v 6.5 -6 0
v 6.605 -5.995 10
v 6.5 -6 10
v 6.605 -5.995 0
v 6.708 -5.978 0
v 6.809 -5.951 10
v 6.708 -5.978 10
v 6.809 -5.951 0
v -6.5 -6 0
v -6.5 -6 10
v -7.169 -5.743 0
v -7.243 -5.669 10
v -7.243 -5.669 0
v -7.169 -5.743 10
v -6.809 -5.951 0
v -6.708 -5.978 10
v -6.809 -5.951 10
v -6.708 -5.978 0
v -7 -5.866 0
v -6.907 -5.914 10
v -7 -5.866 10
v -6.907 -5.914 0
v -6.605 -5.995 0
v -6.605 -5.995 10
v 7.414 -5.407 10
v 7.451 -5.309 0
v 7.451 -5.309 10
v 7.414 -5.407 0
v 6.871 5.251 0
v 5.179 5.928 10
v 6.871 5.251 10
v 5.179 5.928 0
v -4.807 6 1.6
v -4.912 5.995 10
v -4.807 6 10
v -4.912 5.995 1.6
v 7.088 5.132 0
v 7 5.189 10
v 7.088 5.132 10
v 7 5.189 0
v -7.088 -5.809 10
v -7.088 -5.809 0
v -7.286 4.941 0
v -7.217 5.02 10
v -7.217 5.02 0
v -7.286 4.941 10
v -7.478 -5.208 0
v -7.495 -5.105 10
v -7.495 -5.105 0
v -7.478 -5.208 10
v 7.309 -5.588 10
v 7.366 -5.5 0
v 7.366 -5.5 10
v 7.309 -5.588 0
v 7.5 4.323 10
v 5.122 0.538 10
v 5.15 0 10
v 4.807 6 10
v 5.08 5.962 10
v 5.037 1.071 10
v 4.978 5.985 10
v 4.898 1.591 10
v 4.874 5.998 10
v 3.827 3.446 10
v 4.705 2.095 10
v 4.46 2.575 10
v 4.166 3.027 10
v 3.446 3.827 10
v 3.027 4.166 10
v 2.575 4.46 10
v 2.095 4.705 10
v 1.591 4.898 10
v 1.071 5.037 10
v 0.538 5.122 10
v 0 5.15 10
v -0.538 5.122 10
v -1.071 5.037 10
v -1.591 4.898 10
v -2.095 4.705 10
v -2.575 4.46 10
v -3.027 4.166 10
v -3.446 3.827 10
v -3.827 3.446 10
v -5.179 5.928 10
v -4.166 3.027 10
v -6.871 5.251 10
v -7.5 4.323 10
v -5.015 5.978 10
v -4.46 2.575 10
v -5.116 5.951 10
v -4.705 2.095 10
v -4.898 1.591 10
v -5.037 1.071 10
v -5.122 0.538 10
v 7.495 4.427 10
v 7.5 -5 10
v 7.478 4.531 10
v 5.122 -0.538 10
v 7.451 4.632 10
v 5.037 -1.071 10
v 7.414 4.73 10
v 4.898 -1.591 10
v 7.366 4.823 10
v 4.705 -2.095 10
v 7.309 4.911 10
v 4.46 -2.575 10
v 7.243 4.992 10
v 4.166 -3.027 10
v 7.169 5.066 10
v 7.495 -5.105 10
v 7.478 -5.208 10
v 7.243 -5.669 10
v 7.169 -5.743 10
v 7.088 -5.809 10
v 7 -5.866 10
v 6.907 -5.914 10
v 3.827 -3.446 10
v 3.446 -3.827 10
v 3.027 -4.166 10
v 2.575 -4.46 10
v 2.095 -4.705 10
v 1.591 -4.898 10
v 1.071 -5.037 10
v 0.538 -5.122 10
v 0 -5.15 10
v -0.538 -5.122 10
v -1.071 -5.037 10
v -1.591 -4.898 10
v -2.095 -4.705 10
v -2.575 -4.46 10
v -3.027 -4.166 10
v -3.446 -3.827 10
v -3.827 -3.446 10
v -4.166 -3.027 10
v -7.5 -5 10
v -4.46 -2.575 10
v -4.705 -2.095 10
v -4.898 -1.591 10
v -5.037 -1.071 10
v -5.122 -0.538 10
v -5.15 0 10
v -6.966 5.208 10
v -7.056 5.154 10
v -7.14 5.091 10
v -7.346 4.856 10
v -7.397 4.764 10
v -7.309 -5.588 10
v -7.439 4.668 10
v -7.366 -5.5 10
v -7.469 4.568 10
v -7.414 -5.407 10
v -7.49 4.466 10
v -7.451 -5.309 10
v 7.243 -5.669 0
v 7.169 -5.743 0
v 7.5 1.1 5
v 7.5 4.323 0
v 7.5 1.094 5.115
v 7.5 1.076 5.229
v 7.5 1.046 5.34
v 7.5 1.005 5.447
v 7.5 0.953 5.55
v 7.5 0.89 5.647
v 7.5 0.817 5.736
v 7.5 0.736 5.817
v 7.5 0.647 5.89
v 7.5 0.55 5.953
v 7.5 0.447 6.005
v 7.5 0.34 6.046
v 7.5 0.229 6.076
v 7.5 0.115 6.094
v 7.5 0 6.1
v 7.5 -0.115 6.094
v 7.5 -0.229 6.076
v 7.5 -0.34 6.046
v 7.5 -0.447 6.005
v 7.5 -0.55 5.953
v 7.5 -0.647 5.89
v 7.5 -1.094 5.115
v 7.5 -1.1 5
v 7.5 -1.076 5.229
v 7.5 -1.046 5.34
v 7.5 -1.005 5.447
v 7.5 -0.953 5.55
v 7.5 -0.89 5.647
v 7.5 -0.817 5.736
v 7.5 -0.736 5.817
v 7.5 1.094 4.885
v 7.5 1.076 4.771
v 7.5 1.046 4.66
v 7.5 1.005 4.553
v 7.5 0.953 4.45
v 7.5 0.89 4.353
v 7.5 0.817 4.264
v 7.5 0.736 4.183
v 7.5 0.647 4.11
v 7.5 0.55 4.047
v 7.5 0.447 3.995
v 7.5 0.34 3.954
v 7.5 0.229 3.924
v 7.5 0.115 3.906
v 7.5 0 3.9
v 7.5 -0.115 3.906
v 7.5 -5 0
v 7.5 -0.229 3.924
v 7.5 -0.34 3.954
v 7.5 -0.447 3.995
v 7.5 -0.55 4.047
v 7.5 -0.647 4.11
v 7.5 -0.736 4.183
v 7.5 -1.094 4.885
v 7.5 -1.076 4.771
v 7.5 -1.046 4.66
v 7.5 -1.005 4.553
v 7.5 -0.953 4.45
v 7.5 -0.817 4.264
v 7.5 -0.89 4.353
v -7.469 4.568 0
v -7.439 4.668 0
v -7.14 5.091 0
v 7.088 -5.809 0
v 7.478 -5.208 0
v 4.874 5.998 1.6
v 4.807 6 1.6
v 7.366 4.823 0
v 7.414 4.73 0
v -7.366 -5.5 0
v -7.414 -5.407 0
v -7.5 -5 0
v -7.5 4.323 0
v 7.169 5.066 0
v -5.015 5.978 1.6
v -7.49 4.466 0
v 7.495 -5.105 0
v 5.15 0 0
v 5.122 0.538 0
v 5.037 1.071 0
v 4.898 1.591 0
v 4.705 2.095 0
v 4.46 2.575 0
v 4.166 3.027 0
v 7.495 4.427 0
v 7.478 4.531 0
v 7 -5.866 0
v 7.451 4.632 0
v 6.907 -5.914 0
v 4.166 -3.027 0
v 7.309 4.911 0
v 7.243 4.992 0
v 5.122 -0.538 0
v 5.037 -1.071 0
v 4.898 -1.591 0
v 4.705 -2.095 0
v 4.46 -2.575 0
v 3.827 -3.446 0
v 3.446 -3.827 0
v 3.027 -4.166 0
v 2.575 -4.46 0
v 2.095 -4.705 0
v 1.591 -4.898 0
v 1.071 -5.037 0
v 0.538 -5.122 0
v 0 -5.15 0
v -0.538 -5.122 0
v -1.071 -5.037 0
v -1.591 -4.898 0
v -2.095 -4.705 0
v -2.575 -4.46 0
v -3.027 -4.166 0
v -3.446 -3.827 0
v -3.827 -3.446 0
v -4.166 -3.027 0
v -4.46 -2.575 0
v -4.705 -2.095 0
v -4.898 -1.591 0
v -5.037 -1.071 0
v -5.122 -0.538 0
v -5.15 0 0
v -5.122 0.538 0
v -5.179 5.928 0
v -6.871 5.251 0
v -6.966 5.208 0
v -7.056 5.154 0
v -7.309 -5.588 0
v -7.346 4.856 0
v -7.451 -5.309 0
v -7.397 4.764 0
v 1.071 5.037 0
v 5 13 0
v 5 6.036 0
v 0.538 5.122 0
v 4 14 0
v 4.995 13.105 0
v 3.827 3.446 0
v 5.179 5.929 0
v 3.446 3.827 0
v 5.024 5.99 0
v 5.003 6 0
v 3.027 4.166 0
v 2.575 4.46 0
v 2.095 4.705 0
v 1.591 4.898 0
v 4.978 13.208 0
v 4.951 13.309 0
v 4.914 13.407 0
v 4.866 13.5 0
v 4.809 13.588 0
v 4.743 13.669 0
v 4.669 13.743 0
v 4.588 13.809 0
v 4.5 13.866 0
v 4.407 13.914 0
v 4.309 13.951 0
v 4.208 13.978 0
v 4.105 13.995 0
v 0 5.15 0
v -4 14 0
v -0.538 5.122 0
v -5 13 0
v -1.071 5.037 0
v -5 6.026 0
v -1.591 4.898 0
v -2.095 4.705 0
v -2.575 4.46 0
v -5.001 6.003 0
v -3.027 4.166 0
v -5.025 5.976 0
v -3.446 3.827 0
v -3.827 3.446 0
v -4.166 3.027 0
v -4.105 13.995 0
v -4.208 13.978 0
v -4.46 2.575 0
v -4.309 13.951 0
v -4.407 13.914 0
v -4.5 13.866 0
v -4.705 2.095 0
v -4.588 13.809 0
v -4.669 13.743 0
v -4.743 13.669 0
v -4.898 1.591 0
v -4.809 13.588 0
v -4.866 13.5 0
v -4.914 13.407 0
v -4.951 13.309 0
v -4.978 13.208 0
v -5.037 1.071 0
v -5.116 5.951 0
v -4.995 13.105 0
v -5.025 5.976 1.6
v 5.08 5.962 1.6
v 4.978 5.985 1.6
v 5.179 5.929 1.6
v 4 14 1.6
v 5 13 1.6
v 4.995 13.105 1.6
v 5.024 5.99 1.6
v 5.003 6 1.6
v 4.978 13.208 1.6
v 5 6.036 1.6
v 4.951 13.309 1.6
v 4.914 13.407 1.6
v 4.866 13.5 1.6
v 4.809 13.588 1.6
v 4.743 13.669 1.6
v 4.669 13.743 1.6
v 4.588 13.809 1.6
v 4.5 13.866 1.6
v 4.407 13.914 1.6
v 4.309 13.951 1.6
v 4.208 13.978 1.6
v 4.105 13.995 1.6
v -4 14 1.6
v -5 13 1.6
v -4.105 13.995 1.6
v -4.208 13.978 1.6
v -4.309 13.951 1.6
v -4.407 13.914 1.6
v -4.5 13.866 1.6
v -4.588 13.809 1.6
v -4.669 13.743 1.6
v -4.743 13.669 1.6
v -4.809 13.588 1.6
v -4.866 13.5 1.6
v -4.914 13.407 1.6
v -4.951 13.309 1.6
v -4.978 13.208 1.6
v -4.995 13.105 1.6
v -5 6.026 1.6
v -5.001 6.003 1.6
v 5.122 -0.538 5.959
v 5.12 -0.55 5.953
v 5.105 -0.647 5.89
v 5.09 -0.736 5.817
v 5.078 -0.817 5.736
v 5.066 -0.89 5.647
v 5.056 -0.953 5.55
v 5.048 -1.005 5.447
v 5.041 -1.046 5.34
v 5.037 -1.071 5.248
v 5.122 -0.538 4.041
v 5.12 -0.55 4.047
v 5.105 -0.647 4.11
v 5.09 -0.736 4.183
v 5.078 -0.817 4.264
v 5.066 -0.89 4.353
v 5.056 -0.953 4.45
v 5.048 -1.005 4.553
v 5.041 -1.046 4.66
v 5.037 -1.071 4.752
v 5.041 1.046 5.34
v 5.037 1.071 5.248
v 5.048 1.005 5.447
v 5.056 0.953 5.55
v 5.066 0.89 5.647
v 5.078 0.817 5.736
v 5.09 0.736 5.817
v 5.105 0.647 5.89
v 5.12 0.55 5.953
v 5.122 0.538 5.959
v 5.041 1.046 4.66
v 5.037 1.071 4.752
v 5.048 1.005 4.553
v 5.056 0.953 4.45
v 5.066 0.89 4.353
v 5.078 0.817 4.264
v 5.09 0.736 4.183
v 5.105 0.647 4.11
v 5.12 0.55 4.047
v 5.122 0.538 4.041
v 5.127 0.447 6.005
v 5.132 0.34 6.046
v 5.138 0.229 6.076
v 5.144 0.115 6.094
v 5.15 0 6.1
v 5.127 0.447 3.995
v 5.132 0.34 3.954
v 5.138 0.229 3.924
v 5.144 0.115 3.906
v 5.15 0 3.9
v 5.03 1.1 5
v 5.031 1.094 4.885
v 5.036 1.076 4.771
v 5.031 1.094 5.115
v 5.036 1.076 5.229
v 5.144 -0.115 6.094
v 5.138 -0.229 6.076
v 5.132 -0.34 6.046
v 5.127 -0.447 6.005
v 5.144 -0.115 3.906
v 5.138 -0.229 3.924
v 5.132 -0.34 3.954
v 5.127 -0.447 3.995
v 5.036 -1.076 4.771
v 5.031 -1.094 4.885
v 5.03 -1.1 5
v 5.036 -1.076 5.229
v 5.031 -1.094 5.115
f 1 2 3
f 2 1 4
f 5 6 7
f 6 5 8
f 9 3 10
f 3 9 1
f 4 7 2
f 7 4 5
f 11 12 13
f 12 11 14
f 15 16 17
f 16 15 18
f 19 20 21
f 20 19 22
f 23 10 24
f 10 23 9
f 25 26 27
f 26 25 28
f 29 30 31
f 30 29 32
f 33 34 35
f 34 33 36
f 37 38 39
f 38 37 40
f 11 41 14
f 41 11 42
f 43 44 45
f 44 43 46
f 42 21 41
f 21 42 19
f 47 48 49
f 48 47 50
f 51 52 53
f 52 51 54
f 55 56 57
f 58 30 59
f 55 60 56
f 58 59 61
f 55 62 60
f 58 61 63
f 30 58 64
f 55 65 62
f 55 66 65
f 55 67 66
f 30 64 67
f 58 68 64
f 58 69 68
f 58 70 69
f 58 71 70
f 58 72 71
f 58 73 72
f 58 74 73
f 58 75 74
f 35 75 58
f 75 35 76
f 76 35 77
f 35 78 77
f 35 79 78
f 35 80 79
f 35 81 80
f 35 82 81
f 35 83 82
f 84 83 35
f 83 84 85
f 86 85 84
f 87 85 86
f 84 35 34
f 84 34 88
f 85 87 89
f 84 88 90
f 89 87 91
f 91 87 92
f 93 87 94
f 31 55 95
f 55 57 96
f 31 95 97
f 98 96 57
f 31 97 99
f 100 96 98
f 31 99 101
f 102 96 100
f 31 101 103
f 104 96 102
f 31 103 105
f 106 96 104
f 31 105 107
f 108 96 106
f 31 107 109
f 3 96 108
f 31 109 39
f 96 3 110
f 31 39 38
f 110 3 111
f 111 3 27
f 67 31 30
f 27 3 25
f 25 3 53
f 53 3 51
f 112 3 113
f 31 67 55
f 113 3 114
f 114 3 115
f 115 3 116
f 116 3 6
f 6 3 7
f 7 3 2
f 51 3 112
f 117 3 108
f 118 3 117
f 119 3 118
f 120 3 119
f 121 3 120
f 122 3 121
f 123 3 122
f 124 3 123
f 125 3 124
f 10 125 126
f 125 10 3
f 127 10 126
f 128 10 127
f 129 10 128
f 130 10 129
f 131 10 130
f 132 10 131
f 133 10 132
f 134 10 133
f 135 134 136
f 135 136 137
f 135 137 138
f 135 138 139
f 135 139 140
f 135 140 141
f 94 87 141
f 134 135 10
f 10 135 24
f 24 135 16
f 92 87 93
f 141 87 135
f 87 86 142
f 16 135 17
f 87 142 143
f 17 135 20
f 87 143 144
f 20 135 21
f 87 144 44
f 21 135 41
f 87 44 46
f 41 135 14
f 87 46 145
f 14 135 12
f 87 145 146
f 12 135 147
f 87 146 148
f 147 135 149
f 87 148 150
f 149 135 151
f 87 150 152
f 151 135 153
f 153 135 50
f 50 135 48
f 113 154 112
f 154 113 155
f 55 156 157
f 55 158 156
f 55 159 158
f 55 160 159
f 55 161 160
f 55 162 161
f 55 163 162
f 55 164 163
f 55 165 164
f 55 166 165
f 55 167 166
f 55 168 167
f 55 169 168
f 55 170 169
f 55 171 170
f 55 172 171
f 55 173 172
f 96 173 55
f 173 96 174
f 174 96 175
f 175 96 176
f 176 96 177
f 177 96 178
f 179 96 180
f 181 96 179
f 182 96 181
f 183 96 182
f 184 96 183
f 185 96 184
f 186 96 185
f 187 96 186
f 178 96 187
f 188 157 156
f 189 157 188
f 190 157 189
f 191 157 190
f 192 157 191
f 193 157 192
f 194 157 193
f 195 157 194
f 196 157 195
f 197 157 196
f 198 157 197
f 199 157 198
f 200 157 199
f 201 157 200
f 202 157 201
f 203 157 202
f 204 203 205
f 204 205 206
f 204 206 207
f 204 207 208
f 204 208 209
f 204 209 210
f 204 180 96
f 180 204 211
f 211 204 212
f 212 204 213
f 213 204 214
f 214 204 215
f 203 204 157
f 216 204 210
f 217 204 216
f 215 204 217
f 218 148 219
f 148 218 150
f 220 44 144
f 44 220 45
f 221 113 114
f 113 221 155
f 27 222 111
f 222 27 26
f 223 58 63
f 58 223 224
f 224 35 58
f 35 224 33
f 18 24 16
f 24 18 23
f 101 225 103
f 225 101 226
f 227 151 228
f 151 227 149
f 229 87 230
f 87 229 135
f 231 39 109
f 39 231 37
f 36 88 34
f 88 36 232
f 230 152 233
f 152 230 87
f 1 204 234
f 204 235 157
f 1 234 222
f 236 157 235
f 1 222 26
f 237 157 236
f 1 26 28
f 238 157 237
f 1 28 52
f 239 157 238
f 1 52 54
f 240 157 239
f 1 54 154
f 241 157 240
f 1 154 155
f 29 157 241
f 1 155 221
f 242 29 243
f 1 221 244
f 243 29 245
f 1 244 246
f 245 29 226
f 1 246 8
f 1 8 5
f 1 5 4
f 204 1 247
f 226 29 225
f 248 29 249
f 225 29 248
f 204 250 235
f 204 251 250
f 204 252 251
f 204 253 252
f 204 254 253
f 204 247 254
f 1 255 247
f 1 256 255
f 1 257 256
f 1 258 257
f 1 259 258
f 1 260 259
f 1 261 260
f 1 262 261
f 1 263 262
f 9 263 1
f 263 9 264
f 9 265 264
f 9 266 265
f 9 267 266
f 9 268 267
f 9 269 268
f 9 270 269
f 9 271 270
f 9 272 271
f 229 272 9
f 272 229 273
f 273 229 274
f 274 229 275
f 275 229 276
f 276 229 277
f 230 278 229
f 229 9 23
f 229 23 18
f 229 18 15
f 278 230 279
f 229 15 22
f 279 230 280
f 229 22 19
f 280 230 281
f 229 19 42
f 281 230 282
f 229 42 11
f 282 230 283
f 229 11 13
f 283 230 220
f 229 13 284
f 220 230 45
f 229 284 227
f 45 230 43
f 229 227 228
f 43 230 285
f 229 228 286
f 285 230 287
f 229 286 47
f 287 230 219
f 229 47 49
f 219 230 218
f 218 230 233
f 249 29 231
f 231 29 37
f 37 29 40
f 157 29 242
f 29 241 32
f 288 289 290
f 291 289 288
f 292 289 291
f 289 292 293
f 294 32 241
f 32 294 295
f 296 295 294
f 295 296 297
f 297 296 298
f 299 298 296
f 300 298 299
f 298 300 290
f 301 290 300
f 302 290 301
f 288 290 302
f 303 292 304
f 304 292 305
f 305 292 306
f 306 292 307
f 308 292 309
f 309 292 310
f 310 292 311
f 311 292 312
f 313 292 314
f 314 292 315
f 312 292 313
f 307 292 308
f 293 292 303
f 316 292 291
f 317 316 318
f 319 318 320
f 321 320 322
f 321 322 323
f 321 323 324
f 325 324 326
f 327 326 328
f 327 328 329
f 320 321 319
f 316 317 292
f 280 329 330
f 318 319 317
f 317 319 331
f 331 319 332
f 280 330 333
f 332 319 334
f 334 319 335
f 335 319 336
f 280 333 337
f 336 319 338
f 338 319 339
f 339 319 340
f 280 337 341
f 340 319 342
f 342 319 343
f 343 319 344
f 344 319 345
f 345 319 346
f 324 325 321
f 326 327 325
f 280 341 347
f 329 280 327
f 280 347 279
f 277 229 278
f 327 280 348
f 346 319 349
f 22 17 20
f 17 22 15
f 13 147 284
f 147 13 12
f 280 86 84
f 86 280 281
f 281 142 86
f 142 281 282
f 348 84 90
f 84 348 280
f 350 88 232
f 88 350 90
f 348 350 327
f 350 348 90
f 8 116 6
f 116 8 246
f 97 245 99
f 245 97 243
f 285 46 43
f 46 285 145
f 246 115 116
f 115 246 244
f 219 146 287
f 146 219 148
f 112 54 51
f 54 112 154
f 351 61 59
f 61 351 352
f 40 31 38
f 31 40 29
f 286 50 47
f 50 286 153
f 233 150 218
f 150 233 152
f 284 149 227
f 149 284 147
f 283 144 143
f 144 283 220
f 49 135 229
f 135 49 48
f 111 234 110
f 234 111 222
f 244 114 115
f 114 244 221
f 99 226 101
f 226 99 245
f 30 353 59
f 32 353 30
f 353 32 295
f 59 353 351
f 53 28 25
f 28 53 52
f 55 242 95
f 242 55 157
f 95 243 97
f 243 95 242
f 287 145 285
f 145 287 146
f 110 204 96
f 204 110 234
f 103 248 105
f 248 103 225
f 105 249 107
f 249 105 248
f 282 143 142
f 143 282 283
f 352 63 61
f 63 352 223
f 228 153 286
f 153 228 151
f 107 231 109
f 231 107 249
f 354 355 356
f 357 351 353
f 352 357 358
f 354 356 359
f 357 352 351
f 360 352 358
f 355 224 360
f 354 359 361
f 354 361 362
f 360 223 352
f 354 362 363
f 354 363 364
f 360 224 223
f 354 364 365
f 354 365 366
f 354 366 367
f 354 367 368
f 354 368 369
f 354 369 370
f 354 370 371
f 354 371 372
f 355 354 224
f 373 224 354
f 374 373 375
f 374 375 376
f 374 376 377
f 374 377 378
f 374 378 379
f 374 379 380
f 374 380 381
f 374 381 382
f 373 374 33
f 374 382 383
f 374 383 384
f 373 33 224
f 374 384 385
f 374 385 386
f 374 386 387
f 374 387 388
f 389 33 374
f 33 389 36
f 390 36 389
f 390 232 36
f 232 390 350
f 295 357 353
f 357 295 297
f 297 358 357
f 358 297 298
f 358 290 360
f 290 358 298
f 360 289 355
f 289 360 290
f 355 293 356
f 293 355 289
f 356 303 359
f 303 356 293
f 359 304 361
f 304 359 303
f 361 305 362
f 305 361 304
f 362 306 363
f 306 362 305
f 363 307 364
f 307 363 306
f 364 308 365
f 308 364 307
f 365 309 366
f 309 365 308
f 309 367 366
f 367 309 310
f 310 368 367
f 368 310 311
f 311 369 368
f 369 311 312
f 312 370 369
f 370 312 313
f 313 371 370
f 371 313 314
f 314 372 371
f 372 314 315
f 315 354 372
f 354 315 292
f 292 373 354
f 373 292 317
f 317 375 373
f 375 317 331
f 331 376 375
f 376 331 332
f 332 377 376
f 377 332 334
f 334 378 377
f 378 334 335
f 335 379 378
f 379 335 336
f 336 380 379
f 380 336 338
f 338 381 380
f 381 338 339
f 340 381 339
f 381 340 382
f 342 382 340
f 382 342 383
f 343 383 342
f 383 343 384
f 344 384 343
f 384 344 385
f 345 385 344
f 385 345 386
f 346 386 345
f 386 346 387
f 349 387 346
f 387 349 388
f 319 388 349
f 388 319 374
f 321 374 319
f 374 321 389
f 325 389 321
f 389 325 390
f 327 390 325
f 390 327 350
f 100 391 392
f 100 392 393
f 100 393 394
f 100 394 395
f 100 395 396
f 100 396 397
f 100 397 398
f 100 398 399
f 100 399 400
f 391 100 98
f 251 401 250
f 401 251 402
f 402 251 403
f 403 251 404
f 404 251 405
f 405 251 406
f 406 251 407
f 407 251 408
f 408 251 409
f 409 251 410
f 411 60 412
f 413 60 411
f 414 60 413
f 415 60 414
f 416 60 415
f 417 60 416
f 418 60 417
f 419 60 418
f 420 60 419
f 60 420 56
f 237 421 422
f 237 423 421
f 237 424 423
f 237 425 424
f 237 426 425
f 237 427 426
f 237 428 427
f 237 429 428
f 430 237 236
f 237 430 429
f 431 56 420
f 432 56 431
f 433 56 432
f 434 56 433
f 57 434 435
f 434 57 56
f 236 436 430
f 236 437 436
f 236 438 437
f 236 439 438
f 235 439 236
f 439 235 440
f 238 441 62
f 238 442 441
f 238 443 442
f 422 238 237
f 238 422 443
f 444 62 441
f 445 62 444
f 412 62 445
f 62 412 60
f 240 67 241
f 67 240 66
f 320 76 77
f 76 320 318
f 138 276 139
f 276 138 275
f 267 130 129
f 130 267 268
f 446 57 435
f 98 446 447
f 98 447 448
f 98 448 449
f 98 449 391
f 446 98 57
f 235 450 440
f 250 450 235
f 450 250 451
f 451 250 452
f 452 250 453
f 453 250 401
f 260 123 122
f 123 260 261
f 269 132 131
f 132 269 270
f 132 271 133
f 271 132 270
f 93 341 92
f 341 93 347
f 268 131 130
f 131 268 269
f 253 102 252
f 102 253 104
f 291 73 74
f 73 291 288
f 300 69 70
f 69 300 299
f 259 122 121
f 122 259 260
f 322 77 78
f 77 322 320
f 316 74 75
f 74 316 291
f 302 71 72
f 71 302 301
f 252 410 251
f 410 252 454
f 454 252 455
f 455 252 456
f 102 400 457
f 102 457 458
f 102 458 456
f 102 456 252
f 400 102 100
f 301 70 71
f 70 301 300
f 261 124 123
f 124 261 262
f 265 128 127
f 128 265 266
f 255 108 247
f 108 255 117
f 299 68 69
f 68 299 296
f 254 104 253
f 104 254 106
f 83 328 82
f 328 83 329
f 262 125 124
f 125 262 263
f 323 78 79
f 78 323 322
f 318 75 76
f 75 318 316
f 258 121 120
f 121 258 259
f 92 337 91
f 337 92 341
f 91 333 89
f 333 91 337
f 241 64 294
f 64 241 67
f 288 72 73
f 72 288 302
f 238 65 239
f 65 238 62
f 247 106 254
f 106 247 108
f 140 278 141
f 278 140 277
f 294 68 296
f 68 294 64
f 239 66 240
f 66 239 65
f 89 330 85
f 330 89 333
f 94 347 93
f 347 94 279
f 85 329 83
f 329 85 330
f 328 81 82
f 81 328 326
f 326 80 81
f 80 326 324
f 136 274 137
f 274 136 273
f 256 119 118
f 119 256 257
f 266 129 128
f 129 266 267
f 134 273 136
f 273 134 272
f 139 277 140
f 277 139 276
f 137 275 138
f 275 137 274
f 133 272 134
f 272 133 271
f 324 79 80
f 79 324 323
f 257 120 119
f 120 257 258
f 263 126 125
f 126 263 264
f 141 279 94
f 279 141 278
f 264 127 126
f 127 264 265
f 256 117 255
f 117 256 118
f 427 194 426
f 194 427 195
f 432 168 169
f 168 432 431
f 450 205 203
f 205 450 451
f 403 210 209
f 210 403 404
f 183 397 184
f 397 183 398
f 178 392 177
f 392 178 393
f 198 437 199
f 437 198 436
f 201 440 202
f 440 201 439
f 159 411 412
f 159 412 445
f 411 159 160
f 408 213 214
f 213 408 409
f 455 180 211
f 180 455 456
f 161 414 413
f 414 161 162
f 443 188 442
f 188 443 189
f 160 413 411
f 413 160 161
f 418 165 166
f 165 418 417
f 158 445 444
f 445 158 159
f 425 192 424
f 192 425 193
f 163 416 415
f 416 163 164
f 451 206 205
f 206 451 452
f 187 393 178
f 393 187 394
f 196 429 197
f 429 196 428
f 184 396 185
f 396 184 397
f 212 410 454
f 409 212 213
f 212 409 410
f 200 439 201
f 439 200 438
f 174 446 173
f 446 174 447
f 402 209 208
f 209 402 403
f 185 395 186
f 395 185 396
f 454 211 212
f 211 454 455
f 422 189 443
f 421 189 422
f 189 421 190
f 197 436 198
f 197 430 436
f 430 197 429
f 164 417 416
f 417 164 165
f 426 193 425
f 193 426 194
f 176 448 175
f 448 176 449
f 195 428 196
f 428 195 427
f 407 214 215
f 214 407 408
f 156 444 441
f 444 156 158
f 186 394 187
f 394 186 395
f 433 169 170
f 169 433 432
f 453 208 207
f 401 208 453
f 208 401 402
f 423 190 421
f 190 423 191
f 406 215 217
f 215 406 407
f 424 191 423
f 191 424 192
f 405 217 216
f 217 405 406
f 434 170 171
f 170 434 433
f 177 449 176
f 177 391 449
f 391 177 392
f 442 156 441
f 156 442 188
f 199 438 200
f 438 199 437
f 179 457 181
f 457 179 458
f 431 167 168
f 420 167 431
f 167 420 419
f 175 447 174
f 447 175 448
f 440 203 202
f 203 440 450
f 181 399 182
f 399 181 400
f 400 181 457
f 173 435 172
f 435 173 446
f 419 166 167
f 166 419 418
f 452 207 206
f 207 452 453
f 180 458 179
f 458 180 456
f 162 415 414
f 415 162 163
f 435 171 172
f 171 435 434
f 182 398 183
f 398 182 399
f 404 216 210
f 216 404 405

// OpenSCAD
$fn=60;

difference() {
   union() {
      linear_extrude(10) offset(r=1) offset(r=-1) polygon([[-7.5,-6],[7.5,-6],[7.5,5],[5,6],[-5,6],[-7.5,5]]);
      linear_extrude(1.6) offset(r=1) offset(r=-1)  polygon([[-7.5,-6],[7.5,-6],[7.5,5],[5,6],[5,14],[-5,14],[-5,6],[-6,5]]);
   }
   translate([0,0,-0.1]) cylinder(d=10.3,h=11,center=false);
   translate([4,0,5]) rotate([0,90,0]) cylinder(d=2.2,h=4,center=false);
}
